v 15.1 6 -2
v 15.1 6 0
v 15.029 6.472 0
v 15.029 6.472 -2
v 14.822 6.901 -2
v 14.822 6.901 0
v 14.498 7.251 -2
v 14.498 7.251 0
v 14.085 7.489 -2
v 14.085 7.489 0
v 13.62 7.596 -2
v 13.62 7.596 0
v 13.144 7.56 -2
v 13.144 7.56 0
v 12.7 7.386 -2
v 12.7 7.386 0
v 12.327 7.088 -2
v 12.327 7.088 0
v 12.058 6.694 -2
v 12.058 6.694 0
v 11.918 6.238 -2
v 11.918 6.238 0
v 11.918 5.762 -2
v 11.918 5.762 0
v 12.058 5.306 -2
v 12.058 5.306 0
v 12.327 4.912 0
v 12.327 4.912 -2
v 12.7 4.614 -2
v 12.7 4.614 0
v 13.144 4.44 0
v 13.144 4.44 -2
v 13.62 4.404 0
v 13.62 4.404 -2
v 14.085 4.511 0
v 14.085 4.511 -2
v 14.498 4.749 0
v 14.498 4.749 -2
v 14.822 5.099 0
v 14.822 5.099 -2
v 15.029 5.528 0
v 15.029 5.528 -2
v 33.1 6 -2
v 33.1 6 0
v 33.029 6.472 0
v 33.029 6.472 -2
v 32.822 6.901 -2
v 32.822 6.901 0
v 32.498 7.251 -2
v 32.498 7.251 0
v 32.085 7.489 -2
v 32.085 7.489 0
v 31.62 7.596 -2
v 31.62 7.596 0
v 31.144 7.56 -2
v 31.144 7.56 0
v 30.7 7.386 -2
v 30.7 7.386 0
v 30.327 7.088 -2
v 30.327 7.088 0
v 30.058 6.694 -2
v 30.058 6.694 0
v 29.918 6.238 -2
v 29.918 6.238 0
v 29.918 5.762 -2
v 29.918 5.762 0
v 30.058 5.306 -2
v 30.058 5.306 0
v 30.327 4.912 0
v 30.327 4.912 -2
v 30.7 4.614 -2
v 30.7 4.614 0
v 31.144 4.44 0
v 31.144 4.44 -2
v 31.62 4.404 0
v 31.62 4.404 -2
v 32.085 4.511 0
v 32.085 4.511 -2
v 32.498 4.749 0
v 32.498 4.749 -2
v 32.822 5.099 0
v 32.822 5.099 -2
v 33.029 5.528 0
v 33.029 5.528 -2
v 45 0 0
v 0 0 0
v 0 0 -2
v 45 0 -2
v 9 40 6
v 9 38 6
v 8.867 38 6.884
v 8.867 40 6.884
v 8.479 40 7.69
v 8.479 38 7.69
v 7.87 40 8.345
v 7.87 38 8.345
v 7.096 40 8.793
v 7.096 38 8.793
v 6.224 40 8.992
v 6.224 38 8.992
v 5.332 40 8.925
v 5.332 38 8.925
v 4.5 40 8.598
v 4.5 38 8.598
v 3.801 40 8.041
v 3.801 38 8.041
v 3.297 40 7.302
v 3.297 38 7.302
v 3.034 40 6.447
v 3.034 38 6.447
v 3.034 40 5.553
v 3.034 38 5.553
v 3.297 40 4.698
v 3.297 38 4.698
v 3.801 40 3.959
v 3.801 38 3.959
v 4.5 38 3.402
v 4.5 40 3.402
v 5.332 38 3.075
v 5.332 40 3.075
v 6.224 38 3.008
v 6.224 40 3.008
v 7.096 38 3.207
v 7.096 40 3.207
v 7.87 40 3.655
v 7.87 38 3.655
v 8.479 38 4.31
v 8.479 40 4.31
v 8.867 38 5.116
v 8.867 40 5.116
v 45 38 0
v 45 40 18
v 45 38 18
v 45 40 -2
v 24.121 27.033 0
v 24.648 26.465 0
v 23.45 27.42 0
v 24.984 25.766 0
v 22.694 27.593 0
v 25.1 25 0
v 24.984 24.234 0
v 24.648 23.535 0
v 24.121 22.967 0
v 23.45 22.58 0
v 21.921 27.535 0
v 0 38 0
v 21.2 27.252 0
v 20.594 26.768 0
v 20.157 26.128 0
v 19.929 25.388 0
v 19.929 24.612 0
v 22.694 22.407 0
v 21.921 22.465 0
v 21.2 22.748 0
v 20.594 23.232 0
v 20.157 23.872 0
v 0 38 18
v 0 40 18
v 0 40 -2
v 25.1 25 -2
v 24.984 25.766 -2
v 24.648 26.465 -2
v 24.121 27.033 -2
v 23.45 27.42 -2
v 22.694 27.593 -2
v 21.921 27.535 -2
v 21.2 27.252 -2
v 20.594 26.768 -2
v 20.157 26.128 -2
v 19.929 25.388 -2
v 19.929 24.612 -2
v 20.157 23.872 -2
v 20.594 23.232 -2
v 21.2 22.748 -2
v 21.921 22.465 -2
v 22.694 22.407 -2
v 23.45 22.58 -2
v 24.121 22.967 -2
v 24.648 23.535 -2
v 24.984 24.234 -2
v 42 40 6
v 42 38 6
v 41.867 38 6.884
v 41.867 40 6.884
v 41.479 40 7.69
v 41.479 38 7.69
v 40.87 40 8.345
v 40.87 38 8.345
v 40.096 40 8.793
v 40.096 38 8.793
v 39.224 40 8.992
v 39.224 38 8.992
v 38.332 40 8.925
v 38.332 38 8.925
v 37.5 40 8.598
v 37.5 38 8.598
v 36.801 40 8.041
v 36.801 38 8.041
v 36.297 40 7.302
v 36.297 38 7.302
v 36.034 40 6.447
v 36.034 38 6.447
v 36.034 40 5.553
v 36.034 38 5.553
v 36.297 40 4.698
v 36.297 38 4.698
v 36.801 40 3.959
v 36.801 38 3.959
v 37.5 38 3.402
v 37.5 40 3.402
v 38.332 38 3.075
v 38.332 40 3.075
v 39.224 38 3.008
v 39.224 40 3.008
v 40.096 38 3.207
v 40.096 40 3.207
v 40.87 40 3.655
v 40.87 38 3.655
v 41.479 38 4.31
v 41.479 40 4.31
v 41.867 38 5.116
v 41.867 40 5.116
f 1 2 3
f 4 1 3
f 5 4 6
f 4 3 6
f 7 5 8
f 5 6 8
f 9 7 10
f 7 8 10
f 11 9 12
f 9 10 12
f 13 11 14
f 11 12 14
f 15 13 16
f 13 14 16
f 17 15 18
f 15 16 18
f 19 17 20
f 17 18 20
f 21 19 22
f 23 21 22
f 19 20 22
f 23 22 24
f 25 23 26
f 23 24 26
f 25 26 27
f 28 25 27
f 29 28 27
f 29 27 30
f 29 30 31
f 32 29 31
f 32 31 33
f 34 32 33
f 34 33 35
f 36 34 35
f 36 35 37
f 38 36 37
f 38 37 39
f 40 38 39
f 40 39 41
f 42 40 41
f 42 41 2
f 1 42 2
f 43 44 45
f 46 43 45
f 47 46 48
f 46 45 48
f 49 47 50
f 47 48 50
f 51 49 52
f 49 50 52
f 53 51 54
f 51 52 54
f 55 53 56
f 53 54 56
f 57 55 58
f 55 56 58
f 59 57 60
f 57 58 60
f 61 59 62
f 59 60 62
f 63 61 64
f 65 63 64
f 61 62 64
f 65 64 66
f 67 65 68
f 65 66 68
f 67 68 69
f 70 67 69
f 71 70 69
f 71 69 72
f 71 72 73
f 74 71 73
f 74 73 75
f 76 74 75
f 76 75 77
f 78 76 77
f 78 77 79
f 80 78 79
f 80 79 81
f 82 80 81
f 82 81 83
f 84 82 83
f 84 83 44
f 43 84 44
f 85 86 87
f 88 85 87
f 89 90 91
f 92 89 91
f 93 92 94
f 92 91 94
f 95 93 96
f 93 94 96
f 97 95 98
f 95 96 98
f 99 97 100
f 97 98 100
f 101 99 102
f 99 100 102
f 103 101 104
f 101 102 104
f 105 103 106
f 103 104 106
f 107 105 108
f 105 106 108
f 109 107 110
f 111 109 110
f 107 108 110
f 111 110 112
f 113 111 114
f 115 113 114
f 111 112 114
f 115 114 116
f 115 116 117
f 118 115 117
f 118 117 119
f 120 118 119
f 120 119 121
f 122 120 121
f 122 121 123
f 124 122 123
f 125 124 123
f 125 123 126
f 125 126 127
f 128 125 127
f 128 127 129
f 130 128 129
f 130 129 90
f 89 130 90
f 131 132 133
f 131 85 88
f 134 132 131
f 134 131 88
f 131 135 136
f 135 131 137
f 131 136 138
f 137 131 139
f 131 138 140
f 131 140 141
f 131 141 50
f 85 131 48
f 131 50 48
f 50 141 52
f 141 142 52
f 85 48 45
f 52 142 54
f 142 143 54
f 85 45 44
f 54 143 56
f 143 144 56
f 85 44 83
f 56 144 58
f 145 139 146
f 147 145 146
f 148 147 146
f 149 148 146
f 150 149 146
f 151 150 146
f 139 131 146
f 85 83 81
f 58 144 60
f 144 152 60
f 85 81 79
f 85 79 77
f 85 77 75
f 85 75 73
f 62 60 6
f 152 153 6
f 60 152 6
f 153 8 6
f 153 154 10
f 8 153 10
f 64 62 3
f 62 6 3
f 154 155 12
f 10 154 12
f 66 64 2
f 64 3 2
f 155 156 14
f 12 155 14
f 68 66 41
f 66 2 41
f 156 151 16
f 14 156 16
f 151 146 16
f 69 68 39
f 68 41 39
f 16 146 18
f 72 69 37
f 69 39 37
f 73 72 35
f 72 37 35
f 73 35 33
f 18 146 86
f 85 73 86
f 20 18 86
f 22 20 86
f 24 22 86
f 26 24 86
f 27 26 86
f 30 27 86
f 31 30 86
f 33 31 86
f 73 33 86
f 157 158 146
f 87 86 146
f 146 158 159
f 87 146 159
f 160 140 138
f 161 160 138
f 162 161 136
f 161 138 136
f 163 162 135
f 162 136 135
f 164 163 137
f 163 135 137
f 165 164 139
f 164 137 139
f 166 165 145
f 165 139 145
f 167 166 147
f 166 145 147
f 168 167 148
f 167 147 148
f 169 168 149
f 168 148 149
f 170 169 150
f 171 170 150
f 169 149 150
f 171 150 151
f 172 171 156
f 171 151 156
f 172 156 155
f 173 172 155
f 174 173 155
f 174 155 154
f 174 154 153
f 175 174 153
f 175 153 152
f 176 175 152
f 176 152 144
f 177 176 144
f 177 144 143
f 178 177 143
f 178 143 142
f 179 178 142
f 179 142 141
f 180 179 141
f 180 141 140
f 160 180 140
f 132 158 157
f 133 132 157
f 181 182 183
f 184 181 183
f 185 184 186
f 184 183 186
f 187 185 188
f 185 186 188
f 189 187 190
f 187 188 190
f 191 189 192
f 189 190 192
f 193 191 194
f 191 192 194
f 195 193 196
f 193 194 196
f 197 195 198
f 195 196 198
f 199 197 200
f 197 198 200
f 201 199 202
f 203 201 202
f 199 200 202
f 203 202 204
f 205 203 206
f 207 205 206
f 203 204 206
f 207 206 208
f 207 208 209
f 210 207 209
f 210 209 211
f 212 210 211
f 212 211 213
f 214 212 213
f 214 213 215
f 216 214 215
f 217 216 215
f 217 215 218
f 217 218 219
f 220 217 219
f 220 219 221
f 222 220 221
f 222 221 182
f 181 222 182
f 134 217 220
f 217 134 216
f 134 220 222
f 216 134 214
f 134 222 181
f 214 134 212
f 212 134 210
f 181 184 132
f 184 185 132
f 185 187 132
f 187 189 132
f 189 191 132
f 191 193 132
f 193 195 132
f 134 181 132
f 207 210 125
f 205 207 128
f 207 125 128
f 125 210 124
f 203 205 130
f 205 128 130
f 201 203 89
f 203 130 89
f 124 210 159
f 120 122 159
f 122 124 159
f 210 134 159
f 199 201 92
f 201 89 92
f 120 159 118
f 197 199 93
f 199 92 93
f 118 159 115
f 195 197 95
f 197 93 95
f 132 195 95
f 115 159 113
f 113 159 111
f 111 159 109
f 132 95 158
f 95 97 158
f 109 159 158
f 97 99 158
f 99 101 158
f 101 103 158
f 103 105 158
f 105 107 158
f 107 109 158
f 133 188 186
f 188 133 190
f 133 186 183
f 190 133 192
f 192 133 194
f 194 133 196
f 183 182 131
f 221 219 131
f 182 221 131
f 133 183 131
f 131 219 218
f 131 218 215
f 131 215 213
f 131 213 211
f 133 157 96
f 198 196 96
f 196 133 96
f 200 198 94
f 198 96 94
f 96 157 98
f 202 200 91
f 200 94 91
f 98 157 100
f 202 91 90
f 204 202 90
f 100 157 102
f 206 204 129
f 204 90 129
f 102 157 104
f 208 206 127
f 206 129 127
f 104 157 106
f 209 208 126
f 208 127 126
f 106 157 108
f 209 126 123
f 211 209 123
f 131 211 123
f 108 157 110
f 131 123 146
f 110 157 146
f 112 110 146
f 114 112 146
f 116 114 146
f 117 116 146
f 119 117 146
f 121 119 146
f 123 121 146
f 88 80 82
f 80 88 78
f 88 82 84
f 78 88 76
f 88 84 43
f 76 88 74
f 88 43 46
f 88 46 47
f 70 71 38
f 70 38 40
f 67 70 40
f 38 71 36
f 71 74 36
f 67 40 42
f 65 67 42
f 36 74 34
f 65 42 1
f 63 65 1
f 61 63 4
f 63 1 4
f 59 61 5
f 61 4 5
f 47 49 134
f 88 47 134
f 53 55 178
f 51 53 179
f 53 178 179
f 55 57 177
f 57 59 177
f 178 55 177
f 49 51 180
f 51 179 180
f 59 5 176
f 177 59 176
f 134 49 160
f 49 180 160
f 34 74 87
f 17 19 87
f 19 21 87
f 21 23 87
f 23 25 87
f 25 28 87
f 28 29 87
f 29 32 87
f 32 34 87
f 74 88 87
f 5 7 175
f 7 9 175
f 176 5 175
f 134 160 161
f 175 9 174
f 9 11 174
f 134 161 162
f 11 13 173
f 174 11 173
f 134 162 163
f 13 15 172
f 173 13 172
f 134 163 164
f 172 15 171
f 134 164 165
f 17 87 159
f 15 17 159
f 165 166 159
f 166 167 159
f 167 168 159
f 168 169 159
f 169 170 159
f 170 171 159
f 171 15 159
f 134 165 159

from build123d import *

# Parameters (mm, degrees)
EXTRUDE_1_DEPTH     = 45
SKETCH_2_R          = 3
CUT_EXTRUDE_1_DEPTH = 3
SKETCH_3_R          = 2.6
CUT_EXTRUDE_2_DEPTH = 3
SKETCH_4_R          = 1.6
CUT_EXTRUDE_3_DEPTH = 3


with BuildPart() as part:
    # ｽｹｯﾁ1 → ﾎﾞｽ - 押し出し1 (new body)
    with BuildSketch(Plane(origin=(0, 0, 0), x_dir=(0, 0, -1), z_dir=(1, 0, 0))):
        Polygon((-18, 40), (-18, 38), (0, 38), (0, 0), (2, 0), (2, 40), align=None)
    extrude(amount=EXTRUDE_1_DEPTH)

    # ｽｹｯﾁ2 → ｶｯﾄ - 押し出し1 (cut, through all)
    with BuildSketch(Plane.XZ.offset(-38)):
        with Locations((6, 6)):
            Circle(SKETCH_2_R)
        with Locations((39, 6)):
            Circle(SKETCH_2_R)
    extrude(amount=-CUT_EXTRUDE_1_DEPTH, mode=Mode.SUBTRACT)

    # ｽｹｯﾁ3 → ｶｯﾄ - 押し出し2 (cut, through all)
    with BuildSketch(Plane.XY):
        with Locations((22.5, 25)):
            Circle(SKETCH_3_R)
    extrude(amount=-CUT_EXTRUDE_2_DEPTH, mode=Mode.SUBTRACT)

    # ｽｹｯﾁ4 → ｶｯﾄ - 押し出し3 (cut, through all)
    with BuildSketch(Plane.XY):
        with Locations((13.5, 6)):
            Circle(SKETCH_4_R)
        with Locations((31.5, 6)):
            Circle(SKETCH_4_R)
    extrude(amount=-CUT_EXTRUDE_3_DEPTH, mode=Mode.SUBTRACT)


solid = part.part
